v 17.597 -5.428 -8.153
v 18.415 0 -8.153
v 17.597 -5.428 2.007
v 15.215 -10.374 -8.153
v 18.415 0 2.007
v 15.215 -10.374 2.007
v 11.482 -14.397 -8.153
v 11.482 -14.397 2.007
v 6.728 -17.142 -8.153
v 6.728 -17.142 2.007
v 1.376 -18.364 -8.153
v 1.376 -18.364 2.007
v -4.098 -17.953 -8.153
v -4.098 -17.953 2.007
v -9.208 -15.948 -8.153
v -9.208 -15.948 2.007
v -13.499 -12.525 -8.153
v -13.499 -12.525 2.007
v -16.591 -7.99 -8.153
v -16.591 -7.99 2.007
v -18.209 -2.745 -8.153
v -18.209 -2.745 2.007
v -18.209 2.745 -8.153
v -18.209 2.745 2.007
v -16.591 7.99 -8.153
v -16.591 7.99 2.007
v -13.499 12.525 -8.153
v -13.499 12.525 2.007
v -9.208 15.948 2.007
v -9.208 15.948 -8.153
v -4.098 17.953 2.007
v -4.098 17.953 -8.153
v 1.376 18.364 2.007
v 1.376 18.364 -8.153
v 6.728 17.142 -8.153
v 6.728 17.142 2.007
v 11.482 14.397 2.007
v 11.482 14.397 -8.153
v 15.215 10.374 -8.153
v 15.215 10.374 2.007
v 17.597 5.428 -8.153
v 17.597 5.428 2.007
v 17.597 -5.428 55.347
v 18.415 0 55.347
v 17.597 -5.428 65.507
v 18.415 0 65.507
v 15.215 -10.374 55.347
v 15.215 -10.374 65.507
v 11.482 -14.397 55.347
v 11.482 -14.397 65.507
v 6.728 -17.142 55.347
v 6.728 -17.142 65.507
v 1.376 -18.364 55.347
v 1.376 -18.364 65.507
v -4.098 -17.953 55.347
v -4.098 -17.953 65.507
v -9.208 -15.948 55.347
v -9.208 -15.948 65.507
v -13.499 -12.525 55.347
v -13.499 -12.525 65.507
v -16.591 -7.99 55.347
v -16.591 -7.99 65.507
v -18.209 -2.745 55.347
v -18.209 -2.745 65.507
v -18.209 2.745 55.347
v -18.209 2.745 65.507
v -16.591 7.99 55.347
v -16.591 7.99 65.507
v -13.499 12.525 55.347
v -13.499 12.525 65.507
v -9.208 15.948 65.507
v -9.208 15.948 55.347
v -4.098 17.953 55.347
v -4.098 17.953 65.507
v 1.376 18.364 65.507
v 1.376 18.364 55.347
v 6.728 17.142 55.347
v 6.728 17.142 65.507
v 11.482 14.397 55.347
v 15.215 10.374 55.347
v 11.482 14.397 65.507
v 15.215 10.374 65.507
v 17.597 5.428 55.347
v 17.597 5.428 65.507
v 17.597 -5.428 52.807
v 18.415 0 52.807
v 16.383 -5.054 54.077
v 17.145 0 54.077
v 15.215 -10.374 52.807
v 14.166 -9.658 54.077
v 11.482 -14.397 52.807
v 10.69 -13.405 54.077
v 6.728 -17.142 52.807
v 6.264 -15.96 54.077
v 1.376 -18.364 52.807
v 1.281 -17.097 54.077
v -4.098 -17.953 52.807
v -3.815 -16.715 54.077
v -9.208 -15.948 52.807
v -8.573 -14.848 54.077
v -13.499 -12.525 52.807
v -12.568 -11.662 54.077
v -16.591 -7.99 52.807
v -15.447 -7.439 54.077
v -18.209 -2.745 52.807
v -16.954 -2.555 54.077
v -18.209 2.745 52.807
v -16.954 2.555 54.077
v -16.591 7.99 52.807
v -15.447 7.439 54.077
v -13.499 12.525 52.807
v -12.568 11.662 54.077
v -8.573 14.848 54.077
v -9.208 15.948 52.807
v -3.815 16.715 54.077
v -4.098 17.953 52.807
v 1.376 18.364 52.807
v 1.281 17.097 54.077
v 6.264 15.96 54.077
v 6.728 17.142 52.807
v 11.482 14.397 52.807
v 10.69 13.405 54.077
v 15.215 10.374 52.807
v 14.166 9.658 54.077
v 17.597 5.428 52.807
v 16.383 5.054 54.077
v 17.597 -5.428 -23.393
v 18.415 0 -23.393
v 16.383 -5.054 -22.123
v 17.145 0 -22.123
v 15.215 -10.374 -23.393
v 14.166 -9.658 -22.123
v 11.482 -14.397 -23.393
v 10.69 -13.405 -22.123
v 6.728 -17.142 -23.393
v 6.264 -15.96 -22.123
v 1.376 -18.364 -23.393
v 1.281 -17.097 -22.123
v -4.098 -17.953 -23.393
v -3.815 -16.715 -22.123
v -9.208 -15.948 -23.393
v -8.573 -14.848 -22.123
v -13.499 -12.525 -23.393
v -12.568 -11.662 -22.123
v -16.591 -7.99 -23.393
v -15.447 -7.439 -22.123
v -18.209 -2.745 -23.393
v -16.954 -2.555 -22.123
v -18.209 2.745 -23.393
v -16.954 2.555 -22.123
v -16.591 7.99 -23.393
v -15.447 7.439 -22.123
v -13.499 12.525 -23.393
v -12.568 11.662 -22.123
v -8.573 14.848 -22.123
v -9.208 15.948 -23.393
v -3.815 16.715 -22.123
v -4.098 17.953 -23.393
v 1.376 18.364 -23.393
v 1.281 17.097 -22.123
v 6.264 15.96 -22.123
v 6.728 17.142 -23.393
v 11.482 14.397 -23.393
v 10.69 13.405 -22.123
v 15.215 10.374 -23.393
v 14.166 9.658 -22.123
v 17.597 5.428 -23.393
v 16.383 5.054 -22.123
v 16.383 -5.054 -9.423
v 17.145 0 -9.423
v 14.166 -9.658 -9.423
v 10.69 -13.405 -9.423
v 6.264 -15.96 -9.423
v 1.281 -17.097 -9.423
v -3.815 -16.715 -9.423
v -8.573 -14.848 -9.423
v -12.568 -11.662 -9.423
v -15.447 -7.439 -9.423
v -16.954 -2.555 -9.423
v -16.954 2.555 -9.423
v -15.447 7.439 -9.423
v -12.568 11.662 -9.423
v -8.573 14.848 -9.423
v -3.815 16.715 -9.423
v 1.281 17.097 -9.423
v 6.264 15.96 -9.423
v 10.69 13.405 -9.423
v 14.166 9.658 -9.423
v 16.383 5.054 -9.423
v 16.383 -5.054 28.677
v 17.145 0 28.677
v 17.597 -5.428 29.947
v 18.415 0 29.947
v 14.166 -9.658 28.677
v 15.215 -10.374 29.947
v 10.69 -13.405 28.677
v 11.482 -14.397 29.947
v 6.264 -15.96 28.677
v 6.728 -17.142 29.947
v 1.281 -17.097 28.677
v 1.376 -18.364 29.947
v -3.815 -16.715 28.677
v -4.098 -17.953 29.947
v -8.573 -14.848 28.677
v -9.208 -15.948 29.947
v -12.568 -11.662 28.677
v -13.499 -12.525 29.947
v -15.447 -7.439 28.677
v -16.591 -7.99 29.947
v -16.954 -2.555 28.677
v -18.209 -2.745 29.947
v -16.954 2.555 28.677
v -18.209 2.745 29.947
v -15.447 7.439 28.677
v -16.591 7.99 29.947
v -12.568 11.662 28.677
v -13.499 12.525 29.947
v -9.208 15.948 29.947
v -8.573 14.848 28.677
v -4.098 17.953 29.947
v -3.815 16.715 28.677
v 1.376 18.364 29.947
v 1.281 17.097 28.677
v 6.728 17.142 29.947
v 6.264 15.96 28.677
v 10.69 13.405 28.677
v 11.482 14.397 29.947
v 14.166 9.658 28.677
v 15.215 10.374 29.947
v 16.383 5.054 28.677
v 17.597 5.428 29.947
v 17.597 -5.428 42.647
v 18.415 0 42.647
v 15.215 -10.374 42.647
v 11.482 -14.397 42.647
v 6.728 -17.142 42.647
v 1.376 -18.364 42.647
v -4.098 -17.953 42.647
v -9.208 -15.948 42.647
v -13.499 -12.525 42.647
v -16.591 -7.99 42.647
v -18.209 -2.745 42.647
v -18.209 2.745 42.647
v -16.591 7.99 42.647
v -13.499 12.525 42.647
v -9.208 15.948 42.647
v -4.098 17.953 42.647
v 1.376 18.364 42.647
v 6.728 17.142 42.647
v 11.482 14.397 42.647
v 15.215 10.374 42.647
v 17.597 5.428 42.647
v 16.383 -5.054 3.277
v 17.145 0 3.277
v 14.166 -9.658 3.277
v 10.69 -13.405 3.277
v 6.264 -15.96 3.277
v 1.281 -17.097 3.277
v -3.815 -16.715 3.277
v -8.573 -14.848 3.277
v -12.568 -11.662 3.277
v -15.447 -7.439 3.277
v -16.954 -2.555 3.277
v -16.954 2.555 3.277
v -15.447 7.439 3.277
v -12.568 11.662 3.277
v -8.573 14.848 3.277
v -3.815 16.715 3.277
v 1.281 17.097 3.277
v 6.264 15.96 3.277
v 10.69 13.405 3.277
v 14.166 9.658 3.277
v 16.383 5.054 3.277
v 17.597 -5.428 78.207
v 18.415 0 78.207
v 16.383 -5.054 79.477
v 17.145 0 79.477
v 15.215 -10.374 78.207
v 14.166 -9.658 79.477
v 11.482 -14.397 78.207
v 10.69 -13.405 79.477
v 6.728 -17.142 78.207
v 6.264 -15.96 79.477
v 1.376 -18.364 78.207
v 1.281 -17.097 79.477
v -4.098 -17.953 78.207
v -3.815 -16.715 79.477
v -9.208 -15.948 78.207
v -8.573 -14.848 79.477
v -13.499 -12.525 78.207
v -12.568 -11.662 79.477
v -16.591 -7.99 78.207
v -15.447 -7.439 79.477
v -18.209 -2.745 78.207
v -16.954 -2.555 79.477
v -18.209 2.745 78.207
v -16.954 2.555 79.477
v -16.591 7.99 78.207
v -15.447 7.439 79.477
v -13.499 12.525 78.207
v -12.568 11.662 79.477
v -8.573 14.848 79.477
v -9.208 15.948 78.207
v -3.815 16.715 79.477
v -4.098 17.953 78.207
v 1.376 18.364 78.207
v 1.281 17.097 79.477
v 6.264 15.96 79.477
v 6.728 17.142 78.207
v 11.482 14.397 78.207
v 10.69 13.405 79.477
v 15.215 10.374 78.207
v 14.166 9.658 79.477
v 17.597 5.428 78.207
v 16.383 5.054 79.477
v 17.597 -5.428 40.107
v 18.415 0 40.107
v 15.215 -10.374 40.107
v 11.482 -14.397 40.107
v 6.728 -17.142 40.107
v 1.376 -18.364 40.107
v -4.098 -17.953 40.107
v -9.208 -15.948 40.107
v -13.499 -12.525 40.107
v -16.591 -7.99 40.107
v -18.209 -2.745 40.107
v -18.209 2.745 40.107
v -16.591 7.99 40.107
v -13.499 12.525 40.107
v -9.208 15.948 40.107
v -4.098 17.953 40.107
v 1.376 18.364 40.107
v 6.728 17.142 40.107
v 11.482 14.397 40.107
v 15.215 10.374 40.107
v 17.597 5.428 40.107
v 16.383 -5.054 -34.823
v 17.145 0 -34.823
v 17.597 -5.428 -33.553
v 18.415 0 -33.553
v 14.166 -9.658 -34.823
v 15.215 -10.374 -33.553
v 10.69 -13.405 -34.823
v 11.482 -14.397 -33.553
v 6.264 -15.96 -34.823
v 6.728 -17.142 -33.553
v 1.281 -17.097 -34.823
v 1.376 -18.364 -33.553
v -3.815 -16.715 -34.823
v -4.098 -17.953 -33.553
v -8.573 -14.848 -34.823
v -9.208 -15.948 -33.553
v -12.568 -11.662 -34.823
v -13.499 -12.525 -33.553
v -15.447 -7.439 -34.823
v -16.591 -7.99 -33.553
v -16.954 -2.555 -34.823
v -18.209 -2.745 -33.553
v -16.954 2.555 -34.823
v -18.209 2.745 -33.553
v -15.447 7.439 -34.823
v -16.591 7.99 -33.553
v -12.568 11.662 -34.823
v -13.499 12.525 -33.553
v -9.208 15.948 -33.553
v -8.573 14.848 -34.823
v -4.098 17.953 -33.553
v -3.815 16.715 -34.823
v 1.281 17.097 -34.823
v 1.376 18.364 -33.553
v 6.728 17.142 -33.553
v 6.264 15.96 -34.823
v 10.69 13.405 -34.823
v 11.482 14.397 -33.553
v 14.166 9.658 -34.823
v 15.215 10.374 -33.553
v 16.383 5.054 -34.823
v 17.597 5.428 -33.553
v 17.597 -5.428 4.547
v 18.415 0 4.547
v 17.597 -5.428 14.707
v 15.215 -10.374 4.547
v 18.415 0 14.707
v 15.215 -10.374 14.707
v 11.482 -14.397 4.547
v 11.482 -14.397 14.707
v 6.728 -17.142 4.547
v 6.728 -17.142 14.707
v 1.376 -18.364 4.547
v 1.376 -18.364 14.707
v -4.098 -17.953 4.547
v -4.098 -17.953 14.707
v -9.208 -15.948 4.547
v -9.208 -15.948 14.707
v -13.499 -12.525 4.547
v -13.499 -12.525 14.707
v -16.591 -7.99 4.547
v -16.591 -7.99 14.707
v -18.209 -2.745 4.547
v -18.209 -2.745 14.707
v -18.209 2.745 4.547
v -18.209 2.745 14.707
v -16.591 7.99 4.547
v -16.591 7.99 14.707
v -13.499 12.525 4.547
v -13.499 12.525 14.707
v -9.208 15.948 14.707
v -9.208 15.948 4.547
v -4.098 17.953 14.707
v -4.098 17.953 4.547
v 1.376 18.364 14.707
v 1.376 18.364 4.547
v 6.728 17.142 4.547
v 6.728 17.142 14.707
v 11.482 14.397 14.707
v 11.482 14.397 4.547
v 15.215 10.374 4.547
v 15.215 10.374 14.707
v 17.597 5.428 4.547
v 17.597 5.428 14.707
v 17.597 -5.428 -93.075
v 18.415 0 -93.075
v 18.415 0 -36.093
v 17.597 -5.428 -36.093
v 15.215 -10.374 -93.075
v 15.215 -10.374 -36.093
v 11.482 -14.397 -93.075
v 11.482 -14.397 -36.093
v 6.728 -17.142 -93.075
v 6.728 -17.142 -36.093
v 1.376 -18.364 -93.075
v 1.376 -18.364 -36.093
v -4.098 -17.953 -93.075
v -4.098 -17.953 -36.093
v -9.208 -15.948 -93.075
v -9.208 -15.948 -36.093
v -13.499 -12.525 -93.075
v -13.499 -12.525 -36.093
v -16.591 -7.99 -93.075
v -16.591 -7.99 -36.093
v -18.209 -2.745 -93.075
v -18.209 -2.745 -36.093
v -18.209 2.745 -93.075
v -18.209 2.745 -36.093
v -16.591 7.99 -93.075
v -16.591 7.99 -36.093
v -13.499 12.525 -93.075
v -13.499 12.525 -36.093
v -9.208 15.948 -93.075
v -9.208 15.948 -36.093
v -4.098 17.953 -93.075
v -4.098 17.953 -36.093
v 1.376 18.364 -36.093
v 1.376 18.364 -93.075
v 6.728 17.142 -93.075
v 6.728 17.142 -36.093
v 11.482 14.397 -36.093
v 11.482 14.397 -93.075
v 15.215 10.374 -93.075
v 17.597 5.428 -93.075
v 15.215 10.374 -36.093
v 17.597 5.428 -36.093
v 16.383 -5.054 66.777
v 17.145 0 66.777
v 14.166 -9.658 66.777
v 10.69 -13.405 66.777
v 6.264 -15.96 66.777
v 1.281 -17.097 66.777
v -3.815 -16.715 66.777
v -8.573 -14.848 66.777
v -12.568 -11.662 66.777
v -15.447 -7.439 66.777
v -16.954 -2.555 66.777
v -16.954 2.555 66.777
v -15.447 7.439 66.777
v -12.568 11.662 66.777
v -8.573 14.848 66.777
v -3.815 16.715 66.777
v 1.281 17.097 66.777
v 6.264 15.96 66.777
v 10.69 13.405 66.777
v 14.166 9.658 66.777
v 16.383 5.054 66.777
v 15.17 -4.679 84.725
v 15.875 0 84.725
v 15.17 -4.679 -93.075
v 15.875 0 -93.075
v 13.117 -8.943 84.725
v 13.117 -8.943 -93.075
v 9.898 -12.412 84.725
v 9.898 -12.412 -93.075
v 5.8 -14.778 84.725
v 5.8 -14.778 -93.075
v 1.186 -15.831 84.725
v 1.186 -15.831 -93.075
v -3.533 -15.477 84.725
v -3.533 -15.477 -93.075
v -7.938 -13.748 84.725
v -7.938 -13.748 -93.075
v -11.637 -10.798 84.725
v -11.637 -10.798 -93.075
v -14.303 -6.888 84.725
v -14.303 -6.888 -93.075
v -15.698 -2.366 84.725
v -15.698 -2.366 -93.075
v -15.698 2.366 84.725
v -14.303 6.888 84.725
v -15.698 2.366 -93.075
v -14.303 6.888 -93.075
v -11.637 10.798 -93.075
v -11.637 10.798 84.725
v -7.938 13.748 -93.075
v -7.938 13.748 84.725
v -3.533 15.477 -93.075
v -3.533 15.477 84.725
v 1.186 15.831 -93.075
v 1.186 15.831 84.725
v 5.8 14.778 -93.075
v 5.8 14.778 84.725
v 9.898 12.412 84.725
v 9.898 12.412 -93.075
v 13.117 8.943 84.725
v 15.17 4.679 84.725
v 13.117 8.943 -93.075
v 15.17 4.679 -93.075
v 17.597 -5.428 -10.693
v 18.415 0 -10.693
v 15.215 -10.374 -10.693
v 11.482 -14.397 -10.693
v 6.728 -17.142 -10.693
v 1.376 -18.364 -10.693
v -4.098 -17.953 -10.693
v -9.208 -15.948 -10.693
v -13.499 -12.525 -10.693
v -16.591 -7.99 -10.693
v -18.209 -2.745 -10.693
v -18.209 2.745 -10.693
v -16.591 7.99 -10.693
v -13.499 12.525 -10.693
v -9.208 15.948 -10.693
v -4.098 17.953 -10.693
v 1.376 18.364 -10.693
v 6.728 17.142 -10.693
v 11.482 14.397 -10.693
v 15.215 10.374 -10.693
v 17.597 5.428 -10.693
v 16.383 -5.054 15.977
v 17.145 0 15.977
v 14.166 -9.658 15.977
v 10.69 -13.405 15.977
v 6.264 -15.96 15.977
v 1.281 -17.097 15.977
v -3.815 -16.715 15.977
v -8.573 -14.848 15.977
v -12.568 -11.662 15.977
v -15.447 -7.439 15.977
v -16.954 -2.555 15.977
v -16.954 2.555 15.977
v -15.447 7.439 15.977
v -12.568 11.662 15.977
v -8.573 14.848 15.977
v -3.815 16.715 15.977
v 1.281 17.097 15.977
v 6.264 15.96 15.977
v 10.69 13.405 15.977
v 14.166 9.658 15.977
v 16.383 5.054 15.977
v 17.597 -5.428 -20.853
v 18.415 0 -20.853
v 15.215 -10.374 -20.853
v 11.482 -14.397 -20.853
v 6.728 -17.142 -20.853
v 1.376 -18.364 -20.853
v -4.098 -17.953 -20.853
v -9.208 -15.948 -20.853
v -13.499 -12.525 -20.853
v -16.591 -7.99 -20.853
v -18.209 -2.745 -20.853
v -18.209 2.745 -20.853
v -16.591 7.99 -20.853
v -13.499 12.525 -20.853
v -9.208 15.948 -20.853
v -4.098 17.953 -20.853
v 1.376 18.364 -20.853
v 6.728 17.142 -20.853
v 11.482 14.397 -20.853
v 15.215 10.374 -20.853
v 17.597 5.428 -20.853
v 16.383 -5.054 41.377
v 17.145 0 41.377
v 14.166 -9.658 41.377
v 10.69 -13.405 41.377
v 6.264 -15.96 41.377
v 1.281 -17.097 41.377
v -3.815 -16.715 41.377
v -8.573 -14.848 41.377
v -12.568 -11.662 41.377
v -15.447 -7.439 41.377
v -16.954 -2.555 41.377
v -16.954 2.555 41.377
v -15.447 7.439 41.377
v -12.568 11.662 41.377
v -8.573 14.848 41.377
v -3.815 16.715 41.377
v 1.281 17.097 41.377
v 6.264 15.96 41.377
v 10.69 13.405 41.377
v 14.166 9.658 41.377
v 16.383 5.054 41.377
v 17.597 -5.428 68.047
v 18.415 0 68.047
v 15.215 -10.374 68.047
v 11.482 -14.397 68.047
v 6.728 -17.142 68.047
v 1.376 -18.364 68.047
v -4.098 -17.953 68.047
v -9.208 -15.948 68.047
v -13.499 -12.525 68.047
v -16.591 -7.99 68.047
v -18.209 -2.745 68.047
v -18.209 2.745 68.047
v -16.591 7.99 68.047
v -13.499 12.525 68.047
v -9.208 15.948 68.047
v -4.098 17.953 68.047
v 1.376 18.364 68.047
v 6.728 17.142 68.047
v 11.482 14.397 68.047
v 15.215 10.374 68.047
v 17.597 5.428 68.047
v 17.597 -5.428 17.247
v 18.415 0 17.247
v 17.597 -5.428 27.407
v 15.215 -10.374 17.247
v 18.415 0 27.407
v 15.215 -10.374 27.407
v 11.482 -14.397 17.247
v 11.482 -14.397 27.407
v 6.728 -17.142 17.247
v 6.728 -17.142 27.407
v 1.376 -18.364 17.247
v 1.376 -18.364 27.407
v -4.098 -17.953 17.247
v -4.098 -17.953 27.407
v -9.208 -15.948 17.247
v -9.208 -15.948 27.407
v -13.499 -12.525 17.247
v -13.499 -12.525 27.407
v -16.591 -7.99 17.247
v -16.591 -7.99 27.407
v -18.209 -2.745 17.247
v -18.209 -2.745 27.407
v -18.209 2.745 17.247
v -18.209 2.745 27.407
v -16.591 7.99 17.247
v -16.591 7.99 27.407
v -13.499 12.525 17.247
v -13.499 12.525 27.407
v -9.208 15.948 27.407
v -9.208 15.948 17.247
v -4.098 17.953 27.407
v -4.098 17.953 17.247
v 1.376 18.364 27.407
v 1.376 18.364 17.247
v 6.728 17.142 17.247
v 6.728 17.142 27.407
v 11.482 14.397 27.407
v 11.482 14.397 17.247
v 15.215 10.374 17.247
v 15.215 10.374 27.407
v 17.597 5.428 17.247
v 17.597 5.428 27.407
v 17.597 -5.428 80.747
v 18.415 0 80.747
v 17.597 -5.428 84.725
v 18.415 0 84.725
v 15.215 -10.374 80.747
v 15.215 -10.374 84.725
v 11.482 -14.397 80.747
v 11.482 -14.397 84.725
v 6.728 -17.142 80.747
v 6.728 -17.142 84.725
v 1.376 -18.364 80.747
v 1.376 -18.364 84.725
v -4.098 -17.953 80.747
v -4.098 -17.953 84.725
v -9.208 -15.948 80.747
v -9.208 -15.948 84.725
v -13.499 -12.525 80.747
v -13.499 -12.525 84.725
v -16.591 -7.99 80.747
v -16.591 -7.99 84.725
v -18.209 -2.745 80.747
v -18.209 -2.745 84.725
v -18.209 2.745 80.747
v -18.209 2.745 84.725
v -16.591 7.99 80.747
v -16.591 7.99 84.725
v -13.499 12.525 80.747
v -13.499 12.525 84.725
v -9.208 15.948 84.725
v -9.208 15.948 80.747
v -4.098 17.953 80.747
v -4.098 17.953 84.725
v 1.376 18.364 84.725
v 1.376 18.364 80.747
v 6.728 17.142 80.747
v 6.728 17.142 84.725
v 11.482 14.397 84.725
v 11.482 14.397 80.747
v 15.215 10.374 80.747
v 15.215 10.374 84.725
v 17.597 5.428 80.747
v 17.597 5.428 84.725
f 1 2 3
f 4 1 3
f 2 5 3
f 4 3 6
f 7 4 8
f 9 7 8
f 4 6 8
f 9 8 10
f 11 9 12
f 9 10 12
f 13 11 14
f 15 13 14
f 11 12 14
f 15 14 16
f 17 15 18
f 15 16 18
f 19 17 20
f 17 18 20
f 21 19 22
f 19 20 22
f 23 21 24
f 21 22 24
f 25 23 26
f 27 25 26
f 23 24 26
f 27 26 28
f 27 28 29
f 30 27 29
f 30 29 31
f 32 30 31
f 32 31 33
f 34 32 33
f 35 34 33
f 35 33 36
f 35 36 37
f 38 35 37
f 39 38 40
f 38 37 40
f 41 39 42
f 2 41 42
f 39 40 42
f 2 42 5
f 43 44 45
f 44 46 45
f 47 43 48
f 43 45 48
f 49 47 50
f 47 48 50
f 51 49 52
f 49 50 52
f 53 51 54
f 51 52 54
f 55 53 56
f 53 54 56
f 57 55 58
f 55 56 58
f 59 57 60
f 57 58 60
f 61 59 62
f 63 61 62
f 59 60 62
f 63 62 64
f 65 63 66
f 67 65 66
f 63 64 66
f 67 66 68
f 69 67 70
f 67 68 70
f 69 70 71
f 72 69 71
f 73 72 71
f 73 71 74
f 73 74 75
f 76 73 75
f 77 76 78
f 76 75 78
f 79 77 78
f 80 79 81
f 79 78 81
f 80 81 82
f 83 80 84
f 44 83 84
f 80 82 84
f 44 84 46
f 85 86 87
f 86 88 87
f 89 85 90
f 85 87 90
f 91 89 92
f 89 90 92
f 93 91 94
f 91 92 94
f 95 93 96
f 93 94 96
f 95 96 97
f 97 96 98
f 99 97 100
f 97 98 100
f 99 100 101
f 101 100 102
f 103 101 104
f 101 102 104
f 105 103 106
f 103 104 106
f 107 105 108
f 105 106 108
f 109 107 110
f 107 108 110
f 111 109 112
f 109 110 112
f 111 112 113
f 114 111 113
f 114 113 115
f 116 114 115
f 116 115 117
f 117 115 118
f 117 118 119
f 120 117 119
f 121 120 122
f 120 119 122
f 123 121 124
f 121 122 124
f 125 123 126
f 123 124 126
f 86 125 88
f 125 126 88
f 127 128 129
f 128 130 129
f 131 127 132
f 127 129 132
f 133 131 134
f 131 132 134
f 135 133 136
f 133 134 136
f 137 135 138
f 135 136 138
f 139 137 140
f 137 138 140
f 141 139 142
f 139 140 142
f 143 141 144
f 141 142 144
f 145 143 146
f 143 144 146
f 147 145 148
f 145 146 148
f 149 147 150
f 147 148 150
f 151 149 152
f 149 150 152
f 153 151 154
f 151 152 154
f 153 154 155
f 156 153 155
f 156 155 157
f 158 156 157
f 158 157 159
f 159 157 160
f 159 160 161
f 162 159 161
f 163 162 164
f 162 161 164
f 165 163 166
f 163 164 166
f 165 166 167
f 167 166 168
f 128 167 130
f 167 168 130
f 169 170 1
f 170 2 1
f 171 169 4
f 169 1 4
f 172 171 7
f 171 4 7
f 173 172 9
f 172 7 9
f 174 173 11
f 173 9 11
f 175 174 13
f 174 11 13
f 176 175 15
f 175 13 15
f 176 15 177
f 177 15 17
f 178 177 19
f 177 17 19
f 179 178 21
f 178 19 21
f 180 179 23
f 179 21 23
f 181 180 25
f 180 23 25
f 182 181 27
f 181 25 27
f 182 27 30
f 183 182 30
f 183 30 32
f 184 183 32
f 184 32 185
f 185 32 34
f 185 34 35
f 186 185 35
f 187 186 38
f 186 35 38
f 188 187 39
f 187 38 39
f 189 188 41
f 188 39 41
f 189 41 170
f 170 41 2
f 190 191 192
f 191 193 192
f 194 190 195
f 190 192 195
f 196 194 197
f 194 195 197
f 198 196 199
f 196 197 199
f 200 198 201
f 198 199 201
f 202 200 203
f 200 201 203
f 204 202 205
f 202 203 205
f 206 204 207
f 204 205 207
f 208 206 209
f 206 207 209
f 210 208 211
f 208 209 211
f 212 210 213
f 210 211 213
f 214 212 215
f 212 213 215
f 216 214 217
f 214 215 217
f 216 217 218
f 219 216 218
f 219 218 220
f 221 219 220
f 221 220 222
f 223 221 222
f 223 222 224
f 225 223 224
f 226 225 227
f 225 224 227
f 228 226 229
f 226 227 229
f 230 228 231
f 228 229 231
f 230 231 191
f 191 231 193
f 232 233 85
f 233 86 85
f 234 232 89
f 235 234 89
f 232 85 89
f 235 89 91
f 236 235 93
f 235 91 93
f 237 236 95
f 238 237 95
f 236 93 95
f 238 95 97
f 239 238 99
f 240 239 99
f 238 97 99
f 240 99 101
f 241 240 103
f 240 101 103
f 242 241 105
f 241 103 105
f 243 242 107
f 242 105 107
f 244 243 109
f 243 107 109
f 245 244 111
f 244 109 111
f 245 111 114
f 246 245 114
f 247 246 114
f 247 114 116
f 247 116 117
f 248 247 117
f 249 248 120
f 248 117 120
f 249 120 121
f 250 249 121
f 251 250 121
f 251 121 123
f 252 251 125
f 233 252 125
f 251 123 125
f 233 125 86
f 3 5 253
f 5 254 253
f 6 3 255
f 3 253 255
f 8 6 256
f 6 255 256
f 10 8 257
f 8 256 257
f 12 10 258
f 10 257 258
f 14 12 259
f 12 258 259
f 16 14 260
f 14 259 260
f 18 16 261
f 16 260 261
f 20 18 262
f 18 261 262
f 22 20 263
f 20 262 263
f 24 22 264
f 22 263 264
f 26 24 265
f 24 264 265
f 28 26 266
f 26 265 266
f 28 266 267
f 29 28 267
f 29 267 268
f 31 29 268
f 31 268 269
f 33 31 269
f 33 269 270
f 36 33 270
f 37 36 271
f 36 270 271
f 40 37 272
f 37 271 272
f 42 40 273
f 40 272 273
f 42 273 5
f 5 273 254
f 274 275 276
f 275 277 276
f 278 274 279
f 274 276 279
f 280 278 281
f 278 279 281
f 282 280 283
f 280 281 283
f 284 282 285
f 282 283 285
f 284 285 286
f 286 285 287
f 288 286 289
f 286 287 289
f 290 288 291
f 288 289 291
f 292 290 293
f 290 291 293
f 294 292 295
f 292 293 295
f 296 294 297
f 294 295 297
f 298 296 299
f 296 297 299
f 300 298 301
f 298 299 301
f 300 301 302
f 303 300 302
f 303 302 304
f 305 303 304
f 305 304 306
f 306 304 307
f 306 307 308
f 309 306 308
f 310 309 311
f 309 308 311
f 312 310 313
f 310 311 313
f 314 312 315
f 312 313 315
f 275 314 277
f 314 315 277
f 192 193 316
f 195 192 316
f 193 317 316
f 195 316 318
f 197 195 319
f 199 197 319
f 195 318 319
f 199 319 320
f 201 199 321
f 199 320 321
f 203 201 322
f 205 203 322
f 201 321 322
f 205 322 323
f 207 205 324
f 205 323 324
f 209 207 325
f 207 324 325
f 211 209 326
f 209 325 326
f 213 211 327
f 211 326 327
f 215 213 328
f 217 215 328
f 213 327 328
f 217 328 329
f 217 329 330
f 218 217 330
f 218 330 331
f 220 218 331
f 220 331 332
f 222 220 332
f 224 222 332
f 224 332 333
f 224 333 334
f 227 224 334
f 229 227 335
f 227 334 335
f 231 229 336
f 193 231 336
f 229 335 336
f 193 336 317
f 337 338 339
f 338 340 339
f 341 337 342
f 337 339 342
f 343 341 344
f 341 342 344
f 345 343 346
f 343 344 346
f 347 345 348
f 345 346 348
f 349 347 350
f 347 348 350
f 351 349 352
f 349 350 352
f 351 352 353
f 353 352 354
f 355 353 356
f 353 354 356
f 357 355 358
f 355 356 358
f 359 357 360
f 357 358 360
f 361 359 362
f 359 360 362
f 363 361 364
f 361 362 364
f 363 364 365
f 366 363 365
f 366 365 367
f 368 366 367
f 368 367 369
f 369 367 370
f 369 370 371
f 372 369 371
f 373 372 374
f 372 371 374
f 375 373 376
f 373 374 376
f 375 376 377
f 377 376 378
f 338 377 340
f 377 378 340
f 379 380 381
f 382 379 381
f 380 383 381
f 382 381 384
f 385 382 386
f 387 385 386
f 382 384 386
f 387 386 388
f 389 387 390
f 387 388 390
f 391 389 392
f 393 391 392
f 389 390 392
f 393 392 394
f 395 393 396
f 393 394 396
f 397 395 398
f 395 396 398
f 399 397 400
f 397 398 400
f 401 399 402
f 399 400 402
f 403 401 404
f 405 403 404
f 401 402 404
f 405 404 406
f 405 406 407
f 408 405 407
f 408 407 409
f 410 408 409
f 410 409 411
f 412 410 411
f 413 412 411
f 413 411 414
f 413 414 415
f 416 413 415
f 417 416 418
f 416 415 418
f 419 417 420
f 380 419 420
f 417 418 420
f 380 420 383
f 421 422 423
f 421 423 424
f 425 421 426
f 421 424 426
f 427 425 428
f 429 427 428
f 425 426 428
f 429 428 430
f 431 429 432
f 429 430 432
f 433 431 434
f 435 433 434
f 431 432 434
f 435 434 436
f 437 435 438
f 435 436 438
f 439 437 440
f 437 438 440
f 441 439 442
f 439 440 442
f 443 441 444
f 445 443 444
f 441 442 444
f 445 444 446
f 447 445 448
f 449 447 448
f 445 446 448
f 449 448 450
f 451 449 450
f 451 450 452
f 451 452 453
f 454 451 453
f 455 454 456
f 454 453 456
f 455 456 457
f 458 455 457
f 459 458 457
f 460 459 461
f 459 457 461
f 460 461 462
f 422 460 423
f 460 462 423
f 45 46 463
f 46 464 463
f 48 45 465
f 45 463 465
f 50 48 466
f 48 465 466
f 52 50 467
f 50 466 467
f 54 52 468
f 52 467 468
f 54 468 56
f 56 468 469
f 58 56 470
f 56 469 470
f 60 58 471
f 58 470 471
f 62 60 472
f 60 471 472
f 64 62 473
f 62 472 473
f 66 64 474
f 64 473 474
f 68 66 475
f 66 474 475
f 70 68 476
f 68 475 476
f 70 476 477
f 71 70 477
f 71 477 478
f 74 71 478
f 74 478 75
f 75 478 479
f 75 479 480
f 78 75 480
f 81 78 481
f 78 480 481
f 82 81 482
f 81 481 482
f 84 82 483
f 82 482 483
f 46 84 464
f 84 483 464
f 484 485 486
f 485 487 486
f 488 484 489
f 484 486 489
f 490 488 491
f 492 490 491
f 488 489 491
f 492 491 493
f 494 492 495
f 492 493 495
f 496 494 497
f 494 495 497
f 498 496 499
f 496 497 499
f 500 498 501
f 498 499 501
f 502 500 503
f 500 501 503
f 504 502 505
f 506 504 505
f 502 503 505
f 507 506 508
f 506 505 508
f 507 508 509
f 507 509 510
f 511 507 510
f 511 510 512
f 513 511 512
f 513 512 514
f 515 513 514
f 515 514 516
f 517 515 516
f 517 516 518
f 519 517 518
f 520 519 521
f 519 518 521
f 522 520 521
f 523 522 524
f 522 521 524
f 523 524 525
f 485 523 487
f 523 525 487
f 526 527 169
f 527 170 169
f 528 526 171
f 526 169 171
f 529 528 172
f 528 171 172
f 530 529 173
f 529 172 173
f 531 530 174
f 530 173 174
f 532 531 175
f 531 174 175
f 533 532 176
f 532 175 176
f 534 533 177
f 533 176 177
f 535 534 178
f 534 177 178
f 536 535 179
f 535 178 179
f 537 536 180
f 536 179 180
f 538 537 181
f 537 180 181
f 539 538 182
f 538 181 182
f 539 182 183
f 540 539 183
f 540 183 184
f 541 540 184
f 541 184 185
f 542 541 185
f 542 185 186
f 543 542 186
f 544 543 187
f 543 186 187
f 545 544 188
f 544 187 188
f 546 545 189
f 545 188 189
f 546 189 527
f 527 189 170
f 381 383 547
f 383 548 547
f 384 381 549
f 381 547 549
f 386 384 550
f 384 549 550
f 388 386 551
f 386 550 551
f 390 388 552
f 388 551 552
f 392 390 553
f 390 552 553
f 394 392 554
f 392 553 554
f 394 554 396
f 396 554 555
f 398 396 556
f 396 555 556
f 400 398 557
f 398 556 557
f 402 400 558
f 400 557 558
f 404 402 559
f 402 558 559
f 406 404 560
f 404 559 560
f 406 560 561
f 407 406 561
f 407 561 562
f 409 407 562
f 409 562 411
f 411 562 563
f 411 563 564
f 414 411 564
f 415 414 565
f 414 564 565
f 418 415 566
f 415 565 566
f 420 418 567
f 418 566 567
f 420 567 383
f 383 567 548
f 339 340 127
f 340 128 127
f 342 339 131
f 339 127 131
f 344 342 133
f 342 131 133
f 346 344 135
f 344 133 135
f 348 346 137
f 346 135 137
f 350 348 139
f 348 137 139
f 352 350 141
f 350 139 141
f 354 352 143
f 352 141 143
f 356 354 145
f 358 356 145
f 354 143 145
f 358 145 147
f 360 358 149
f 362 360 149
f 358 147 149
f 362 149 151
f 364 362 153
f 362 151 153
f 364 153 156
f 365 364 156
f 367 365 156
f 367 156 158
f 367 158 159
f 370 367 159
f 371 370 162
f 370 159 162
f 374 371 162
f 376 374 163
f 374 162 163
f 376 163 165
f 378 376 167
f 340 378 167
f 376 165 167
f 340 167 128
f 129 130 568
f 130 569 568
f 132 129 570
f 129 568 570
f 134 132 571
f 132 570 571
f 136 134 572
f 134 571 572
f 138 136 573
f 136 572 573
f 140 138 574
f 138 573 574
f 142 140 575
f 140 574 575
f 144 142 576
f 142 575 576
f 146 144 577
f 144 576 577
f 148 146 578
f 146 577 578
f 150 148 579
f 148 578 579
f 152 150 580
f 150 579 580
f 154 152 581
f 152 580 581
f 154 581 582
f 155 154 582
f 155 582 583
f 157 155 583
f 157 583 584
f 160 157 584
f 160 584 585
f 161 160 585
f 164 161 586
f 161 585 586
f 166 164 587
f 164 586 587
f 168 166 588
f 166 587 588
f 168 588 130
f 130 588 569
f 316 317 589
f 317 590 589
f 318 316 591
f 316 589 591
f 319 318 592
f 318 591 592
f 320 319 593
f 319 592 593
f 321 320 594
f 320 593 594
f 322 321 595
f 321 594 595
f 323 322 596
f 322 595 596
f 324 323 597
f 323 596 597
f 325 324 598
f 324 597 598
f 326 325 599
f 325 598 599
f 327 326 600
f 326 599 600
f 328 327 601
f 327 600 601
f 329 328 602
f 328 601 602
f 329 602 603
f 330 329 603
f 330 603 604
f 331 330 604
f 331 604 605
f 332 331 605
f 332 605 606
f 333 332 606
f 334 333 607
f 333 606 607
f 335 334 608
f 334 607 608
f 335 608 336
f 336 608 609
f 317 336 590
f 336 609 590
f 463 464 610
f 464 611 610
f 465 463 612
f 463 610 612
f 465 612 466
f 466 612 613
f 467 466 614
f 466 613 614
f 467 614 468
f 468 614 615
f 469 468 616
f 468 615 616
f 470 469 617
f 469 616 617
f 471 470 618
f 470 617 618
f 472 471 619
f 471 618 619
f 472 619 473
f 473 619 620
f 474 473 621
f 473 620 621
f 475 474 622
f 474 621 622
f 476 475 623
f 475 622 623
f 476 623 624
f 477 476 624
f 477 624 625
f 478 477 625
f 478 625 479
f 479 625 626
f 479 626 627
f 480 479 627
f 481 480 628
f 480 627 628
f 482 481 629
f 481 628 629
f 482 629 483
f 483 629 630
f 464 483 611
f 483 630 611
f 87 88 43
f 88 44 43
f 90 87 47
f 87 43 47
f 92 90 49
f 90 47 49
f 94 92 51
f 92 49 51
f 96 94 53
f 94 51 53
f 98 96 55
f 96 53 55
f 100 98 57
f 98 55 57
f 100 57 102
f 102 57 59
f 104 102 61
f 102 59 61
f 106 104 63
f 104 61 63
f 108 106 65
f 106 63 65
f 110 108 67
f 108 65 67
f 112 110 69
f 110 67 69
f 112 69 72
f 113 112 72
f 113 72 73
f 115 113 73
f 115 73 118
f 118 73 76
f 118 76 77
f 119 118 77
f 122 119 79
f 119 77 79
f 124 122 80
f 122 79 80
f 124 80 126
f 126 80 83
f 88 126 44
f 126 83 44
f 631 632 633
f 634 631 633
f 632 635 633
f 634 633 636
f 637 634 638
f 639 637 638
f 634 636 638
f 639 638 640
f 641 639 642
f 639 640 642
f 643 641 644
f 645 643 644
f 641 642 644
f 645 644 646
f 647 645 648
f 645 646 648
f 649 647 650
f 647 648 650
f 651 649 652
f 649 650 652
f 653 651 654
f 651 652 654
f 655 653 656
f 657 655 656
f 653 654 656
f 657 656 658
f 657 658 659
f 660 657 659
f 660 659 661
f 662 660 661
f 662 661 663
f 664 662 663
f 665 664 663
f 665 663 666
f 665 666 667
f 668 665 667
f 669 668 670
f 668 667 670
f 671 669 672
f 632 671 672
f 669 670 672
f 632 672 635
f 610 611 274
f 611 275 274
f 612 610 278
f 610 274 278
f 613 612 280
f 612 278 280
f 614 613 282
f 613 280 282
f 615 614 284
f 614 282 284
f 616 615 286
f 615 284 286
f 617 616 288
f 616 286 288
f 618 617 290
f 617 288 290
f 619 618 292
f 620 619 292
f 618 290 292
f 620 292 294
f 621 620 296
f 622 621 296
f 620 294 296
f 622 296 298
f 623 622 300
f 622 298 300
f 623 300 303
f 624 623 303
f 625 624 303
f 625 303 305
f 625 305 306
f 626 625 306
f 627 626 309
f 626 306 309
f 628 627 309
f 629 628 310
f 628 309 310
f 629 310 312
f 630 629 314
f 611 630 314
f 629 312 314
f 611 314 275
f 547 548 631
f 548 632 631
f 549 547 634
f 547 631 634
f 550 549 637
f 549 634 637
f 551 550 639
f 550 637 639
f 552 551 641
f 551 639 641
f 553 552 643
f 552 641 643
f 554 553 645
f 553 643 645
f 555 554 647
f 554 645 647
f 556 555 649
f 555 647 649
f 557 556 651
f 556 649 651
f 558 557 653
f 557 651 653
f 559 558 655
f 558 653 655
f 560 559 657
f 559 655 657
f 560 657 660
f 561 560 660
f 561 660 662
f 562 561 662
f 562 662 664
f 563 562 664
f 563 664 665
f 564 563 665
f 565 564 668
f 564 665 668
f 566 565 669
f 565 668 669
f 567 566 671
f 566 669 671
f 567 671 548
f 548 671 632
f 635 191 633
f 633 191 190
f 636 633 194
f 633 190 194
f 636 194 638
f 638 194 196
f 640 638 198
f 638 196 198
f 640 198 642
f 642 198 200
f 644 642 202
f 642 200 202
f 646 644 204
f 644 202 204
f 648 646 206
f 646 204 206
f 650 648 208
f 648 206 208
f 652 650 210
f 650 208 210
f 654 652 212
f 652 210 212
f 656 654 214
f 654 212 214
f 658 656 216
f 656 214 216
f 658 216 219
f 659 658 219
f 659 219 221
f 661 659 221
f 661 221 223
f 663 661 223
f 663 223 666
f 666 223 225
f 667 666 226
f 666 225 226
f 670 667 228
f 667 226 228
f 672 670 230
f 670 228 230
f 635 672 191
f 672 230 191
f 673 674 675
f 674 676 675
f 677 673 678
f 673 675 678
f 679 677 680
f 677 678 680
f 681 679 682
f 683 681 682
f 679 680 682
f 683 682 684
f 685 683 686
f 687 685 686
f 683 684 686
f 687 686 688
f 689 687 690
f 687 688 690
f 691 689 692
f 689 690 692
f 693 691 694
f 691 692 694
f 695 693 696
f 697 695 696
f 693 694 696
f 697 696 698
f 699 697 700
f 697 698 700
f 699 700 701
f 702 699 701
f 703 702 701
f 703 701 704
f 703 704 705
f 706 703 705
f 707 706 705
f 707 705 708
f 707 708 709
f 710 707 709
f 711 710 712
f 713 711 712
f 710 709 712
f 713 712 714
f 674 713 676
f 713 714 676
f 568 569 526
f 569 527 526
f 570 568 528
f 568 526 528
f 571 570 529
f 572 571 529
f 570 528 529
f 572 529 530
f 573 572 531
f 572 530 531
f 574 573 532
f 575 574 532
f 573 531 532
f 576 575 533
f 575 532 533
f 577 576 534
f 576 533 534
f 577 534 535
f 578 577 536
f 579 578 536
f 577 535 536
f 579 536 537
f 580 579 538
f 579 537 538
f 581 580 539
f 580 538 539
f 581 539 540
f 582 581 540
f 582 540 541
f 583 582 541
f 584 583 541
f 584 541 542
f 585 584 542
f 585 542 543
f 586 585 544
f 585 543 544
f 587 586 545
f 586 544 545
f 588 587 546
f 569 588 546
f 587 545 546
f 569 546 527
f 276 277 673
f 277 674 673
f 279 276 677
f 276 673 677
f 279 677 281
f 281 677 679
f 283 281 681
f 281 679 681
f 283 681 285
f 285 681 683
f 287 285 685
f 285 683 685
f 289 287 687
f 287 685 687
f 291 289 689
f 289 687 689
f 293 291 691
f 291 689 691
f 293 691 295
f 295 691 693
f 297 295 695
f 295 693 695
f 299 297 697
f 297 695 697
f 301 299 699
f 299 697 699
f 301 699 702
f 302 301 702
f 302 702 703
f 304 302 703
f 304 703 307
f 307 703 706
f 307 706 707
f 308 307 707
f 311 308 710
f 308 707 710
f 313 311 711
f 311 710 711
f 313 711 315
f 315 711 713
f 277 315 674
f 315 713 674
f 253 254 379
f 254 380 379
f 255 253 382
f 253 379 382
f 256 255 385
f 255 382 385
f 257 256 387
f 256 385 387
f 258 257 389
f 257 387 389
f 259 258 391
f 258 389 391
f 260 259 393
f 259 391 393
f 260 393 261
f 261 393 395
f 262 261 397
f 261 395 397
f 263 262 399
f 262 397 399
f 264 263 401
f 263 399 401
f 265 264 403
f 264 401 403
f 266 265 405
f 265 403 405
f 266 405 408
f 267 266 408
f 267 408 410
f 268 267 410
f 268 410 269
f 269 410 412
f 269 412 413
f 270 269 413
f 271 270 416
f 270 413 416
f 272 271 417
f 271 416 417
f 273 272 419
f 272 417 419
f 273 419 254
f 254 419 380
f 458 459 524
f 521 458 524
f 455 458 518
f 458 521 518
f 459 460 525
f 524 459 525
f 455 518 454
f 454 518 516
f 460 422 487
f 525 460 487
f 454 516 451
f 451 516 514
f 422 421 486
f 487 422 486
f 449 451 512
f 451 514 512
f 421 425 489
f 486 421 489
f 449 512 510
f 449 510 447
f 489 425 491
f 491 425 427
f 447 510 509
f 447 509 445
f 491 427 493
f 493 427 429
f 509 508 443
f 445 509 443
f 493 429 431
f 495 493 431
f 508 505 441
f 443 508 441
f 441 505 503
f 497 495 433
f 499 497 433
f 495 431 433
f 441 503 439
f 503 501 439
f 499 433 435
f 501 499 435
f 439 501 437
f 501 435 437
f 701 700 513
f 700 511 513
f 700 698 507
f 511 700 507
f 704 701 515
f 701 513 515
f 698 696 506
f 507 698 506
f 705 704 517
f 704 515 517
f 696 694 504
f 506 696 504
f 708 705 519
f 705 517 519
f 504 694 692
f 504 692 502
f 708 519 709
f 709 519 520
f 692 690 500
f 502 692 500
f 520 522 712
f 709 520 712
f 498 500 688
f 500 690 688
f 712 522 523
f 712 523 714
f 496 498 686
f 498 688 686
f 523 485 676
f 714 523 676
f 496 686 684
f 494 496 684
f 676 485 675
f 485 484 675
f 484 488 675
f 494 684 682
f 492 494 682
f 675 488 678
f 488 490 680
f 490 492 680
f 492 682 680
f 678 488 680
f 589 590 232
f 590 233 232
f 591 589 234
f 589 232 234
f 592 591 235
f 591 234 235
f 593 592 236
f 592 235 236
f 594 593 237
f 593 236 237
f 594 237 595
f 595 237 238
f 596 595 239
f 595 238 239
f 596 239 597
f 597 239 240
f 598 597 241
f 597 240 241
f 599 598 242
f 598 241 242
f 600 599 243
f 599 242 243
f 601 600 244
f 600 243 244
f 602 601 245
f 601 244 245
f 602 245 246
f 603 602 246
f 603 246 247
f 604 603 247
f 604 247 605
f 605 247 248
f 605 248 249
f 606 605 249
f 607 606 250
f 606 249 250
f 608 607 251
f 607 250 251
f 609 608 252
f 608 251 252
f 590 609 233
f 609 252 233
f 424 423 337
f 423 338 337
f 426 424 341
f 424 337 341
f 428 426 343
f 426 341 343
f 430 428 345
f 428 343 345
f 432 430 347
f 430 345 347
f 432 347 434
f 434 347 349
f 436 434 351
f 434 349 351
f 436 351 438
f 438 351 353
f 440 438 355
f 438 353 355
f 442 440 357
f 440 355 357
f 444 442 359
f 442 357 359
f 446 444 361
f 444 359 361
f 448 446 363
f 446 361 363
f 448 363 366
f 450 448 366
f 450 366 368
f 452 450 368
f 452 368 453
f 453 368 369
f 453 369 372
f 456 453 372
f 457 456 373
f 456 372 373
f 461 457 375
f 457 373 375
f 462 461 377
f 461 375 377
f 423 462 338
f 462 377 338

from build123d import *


with BuildPart() as f2:
    # F0 (on Front) → F2 (revolve)
    with BuildSketch(Plane.XZ):
        Polygon((18.415, 84.724767), (15.875, 84.724767), (15.875, -93.075233), (18.415, -93.075233), (18.415, -36.09307), (17.145, -34.82307), (18.415, -33.55307), (18.415, -23.39307), (17.145, -22.12307), (18.415, -20.85307), (18.415, -10.69307), (17.145, -9.42307), (18.415, -8.15307), (18.415, 2.00693), (17.145, 3.27693), (18.415, 4.54693), (18.415, 14.70693), (17.145, 15.97693), (18.415, 17.24693), (18.415, 27.40693), (17.145, 28.67693), (18.415, 29.94693), (18.415, 40.10693), (17.145, 41.37693), (18.415, 42.64693), (18.415, 52.80693), (17.145, 54.07693), (18.415, 55.34693), (18.415, 65.50693), (17.145, 66.77693), (18.415, 68.04693), (18.415, 78.20693), (17.145, 79.47693), (18.415, 80.74693), align=None)
    revolve(axis=Axis((0, 0, -4.614733), (0, 0, -1)))


solid = f2.part
